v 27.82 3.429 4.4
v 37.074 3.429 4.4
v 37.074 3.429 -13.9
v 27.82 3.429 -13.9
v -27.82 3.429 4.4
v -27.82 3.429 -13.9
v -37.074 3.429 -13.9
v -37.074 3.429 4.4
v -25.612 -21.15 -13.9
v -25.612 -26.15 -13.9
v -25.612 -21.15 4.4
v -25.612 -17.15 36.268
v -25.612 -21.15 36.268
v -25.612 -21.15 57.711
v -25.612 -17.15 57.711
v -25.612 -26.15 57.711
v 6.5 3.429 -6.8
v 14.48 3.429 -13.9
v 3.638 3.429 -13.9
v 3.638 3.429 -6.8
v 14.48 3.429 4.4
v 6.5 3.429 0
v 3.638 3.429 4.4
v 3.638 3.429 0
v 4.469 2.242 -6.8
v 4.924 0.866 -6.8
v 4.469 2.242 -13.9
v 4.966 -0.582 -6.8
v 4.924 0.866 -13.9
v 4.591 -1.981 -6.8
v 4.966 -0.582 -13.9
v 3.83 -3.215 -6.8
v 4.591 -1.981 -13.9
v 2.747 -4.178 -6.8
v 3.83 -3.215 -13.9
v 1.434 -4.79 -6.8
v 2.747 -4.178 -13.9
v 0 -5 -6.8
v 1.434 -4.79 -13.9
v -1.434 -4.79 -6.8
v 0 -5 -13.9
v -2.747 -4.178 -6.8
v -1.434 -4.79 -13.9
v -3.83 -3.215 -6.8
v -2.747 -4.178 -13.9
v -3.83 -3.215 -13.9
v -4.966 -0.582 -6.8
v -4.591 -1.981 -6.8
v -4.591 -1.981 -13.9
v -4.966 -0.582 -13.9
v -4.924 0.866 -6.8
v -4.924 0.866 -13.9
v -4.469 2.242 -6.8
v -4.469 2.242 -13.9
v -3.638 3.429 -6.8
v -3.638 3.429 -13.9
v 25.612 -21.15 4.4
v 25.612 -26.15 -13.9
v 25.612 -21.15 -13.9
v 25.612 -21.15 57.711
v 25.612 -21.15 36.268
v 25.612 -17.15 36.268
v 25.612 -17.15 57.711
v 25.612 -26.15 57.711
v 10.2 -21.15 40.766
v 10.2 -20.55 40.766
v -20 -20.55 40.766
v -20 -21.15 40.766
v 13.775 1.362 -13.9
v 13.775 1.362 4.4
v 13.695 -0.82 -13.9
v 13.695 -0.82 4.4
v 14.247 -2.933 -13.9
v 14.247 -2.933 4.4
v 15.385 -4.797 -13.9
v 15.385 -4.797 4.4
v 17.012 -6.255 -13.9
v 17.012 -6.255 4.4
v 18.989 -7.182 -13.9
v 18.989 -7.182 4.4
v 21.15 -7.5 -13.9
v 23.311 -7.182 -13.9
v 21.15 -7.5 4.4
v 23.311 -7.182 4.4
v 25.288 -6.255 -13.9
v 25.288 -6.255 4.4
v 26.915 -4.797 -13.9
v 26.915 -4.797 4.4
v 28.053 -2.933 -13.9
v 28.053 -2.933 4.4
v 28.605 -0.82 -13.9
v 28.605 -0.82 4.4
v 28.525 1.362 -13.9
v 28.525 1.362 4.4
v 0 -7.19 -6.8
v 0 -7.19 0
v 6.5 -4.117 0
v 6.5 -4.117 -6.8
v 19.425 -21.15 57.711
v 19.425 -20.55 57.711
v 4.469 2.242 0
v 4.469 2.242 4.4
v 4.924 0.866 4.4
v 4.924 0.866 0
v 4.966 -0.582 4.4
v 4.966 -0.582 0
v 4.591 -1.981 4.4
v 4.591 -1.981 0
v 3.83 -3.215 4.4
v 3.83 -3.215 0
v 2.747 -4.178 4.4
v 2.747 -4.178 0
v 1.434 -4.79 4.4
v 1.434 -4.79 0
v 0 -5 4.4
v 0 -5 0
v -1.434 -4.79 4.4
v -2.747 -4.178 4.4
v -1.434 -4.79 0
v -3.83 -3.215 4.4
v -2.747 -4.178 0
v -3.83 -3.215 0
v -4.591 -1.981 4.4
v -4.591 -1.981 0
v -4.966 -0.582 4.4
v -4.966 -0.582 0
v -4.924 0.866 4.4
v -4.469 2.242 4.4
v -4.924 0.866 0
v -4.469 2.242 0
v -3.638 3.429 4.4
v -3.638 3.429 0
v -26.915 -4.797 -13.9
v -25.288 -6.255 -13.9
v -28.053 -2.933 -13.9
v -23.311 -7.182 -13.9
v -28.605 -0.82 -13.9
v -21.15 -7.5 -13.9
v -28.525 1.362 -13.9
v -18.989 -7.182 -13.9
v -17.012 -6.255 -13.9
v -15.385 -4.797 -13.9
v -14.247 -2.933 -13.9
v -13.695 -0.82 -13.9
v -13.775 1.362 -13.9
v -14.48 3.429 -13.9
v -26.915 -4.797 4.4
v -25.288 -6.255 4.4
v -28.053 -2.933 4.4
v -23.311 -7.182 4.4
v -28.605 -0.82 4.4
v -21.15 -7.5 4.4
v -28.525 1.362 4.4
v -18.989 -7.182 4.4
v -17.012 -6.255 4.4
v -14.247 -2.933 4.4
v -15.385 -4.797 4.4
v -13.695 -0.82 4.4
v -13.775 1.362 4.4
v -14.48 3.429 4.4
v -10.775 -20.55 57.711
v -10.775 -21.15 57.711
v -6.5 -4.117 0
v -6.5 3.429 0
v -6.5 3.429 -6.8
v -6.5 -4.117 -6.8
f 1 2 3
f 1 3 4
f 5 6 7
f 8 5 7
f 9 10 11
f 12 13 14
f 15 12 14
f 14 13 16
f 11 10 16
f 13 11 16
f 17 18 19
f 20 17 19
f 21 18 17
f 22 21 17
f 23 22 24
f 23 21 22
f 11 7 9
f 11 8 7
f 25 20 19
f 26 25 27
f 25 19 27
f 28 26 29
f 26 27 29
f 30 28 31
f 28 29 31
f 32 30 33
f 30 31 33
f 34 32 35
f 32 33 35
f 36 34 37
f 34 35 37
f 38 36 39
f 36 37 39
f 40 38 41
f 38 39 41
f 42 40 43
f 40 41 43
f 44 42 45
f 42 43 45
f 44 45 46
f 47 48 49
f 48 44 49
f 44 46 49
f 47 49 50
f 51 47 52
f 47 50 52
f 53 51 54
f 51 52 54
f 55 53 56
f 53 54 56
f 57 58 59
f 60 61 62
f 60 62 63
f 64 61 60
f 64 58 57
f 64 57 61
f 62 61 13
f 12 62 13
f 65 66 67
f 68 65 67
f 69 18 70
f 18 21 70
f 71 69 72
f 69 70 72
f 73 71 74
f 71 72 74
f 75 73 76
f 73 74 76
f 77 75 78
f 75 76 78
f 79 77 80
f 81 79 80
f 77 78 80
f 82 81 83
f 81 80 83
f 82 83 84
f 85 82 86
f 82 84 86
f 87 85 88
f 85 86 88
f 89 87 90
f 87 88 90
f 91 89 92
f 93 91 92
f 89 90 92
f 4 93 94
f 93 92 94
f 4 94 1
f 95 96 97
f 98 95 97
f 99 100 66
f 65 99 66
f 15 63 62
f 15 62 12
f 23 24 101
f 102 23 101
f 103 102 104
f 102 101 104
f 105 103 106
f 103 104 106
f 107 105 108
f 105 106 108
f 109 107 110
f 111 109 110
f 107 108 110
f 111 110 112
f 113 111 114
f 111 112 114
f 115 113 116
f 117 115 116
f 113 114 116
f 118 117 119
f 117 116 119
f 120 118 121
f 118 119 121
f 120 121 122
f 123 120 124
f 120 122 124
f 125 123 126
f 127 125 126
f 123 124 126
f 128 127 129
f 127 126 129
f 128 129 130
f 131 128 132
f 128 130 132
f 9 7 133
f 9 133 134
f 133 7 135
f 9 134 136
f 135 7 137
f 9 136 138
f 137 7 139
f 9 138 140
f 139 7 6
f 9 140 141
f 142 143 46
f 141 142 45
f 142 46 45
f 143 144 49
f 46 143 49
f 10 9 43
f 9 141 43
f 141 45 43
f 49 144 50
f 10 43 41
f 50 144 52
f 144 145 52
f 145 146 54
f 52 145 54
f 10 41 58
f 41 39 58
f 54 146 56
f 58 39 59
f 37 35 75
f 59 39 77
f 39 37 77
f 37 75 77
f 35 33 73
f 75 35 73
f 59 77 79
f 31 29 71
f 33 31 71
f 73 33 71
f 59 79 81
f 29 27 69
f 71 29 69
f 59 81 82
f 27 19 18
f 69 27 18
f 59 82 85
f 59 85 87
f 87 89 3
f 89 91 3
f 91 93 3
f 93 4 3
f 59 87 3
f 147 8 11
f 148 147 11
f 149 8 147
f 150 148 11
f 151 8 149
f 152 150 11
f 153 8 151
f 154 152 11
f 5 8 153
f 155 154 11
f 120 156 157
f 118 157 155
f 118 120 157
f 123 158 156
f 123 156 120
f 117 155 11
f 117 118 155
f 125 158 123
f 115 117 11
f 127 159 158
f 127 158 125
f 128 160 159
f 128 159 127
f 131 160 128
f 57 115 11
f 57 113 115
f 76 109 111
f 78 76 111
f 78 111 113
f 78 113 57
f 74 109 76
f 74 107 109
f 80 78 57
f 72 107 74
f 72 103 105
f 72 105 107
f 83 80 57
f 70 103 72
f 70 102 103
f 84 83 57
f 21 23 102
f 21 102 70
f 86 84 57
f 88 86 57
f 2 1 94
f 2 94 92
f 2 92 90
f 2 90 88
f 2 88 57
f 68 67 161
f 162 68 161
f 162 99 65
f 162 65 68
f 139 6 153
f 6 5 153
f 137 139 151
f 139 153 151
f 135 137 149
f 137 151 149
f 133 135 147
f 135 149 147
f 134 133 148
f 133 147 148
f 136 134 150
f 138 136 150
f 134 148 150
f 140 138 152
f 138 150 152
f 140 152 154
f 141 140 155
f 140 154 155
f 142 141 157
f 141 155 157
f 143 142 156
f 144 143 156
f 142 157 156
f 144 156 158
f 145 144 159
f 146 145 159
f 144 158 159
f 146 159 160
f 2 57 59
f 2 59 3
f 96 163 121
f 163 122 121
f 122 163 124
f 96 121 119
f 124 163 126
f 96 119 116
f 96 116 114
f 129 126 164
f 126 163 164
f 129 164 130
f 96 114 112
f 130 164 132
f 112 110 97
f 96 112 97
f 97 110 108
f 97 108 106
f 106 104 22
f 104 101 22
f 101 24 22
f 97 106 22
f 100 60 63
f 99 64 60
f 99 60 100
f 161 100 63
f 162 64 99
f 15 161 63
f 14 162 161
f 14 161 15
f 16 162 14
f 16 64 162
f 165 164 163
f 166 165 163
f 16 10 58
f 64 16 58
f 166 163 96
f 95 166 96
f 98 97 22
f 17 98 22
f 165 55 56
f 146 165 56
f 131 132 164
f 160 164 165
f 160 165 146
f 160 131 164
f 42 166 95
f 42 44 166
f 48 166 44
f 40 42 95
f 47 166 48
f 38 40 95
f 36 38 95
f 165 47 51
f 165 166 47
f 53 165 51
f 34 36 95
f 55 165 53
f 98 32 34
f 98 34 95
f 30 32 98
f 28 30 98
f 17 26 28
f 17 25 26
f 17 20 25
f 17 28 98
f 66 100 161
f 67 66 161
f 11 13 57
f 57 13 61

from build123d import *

# Parameters (mm, degrees)
F0_R           = 7.5
F1_DEPTH       = 7.6
F1_DEPTH_BACK  = 17.3
F2_DEPTH       = 6.8
F4_DEPTH       = 4.4
F4_DEPTH_BACK  = 13.9
F6_W           = 51.2241850299
F6_H           = 71.6110350132
F7_DEPTH       = 5
F10_DEPTH      = 0.6
F11_W          = 51.2241850299
F11_H          = 21.4426852763
F12_DEPTH      = 4
F15_R          = 5
F16_DEPTH      = 25
F16_DEPTH_BACK = 25


with BuildPart() as f1:
    # F0 (on Top) → F1 (new body, two sides)
    with BuildSketch(Plane.XY) as f1_sk:
        with Locations((-21.15, 0)):
            Circle(F0_R)
    extrude(amount=F1_DEPTH)
    extrude(f1_sk.sketch, amount=-F1_DEPTH_BACK)


with BuildPart() as f1b:
    # F0 (on Top) → F1, piece 2 (new body, two sides)
    with BuildSketch(Plane.XY) as f1_2_sk:
        with Locations((21.15, 0)):
            Circle(F0_R)
    extrude(amount=F1_DEPTH)
    extrude(f1_2_sk.sketch, amount=-F1_DEPTH_BACK)


with BuildPart() as f2:
    # F0 (on Top) → F2 (new body)
    with BuildSketch(Plane.XY):
        Polygon((-6.5, 4.1165491707), (-6.5, 0), (-6.5, -4.1165491707), (0, -7.19), (6.5, -4.1165491707), (6.5, 0), (6.5, 4.1165491707), (0, 7.19), align=None)
    extrude(amount=-F2_DEPTH)


with BuildPart() as f4:
    # F3 (on Top) → F4 (new body, two sides)
    with BuildSketch(Plane.XY) as f4_sk:
        Polygon((-25.612092515, -21.15), (25.612092515, -21.15), (37.0736953387, 3.4294865757), (-37.0736953387, 3.4294865757), align=None)
    extrude(amount=F4_DEPTH)
    extrude(f4_sk.sketch, amount=-F4_DEPTH_BACK)

    # F5: cut F1, F2, F1b
    add(f1.part, mode=Mode.SUBTRACT)
    add(f2.part, mode=Mode.SUBTRACT)
    add(f1b.part, mode=Mode.SUBTRACT)

    # F6 (on face) → F7 (join)
    with BuildSketch(Plane.XZ.offset(21.15)):
        with Locations((0, 21.9055175066)):
            Rectangle(F6_W, F6_H)
    extrude(amount=F7_DEPTH)

    # F11 (on face) → F12 (join)
    with BuildSketch(Plane(origin=(0, -21.15, 0), x_dir=(-1, 0, 0), z_dir=(0, 1, 0))):
        with Locations((0, 46.9896923751)):
            Rectangle(F11_W, F11_H)
    extrude(amount=F12_DEPTH)


with BuildPart() as f10:
    # F9 (on offset) → F10 (new body)
    with BuildSketch(Plane(origin=(0, -20.55, 0), x_dir=(-1, 0, 0), z_dir=(0, 1, 0))):
        Polygon((-20, 58.7664473951), (-10.2, 40.7664473951), (20, 40.7664473951), (10.2, 58.7664473951), align=None)
    extrude(amount=-F10_DEPTH)


with BuildPart() as f4_1:
    add(f4.part)

    # F13: cut F10
    add(f10.part, mode=Mode.SUBTRACT)

    # F15 (on face) → F16 (cut, two sides)
    with BuildSketch(Plane(origin=(0, 0, -13.9), x_dir=(1, 0, 0), z_dir=(0, 0, -1))) as f16_sk:
        Circle(F15_R)
    extrude(amount=-F16_DEPTH, mode=Mode.SUBTRACT)
    extrude(f16_sk.sketch, amount=F16_DEPTH_BACK, mode=Mode.SUBTRACT)


solid = f4_1.part
